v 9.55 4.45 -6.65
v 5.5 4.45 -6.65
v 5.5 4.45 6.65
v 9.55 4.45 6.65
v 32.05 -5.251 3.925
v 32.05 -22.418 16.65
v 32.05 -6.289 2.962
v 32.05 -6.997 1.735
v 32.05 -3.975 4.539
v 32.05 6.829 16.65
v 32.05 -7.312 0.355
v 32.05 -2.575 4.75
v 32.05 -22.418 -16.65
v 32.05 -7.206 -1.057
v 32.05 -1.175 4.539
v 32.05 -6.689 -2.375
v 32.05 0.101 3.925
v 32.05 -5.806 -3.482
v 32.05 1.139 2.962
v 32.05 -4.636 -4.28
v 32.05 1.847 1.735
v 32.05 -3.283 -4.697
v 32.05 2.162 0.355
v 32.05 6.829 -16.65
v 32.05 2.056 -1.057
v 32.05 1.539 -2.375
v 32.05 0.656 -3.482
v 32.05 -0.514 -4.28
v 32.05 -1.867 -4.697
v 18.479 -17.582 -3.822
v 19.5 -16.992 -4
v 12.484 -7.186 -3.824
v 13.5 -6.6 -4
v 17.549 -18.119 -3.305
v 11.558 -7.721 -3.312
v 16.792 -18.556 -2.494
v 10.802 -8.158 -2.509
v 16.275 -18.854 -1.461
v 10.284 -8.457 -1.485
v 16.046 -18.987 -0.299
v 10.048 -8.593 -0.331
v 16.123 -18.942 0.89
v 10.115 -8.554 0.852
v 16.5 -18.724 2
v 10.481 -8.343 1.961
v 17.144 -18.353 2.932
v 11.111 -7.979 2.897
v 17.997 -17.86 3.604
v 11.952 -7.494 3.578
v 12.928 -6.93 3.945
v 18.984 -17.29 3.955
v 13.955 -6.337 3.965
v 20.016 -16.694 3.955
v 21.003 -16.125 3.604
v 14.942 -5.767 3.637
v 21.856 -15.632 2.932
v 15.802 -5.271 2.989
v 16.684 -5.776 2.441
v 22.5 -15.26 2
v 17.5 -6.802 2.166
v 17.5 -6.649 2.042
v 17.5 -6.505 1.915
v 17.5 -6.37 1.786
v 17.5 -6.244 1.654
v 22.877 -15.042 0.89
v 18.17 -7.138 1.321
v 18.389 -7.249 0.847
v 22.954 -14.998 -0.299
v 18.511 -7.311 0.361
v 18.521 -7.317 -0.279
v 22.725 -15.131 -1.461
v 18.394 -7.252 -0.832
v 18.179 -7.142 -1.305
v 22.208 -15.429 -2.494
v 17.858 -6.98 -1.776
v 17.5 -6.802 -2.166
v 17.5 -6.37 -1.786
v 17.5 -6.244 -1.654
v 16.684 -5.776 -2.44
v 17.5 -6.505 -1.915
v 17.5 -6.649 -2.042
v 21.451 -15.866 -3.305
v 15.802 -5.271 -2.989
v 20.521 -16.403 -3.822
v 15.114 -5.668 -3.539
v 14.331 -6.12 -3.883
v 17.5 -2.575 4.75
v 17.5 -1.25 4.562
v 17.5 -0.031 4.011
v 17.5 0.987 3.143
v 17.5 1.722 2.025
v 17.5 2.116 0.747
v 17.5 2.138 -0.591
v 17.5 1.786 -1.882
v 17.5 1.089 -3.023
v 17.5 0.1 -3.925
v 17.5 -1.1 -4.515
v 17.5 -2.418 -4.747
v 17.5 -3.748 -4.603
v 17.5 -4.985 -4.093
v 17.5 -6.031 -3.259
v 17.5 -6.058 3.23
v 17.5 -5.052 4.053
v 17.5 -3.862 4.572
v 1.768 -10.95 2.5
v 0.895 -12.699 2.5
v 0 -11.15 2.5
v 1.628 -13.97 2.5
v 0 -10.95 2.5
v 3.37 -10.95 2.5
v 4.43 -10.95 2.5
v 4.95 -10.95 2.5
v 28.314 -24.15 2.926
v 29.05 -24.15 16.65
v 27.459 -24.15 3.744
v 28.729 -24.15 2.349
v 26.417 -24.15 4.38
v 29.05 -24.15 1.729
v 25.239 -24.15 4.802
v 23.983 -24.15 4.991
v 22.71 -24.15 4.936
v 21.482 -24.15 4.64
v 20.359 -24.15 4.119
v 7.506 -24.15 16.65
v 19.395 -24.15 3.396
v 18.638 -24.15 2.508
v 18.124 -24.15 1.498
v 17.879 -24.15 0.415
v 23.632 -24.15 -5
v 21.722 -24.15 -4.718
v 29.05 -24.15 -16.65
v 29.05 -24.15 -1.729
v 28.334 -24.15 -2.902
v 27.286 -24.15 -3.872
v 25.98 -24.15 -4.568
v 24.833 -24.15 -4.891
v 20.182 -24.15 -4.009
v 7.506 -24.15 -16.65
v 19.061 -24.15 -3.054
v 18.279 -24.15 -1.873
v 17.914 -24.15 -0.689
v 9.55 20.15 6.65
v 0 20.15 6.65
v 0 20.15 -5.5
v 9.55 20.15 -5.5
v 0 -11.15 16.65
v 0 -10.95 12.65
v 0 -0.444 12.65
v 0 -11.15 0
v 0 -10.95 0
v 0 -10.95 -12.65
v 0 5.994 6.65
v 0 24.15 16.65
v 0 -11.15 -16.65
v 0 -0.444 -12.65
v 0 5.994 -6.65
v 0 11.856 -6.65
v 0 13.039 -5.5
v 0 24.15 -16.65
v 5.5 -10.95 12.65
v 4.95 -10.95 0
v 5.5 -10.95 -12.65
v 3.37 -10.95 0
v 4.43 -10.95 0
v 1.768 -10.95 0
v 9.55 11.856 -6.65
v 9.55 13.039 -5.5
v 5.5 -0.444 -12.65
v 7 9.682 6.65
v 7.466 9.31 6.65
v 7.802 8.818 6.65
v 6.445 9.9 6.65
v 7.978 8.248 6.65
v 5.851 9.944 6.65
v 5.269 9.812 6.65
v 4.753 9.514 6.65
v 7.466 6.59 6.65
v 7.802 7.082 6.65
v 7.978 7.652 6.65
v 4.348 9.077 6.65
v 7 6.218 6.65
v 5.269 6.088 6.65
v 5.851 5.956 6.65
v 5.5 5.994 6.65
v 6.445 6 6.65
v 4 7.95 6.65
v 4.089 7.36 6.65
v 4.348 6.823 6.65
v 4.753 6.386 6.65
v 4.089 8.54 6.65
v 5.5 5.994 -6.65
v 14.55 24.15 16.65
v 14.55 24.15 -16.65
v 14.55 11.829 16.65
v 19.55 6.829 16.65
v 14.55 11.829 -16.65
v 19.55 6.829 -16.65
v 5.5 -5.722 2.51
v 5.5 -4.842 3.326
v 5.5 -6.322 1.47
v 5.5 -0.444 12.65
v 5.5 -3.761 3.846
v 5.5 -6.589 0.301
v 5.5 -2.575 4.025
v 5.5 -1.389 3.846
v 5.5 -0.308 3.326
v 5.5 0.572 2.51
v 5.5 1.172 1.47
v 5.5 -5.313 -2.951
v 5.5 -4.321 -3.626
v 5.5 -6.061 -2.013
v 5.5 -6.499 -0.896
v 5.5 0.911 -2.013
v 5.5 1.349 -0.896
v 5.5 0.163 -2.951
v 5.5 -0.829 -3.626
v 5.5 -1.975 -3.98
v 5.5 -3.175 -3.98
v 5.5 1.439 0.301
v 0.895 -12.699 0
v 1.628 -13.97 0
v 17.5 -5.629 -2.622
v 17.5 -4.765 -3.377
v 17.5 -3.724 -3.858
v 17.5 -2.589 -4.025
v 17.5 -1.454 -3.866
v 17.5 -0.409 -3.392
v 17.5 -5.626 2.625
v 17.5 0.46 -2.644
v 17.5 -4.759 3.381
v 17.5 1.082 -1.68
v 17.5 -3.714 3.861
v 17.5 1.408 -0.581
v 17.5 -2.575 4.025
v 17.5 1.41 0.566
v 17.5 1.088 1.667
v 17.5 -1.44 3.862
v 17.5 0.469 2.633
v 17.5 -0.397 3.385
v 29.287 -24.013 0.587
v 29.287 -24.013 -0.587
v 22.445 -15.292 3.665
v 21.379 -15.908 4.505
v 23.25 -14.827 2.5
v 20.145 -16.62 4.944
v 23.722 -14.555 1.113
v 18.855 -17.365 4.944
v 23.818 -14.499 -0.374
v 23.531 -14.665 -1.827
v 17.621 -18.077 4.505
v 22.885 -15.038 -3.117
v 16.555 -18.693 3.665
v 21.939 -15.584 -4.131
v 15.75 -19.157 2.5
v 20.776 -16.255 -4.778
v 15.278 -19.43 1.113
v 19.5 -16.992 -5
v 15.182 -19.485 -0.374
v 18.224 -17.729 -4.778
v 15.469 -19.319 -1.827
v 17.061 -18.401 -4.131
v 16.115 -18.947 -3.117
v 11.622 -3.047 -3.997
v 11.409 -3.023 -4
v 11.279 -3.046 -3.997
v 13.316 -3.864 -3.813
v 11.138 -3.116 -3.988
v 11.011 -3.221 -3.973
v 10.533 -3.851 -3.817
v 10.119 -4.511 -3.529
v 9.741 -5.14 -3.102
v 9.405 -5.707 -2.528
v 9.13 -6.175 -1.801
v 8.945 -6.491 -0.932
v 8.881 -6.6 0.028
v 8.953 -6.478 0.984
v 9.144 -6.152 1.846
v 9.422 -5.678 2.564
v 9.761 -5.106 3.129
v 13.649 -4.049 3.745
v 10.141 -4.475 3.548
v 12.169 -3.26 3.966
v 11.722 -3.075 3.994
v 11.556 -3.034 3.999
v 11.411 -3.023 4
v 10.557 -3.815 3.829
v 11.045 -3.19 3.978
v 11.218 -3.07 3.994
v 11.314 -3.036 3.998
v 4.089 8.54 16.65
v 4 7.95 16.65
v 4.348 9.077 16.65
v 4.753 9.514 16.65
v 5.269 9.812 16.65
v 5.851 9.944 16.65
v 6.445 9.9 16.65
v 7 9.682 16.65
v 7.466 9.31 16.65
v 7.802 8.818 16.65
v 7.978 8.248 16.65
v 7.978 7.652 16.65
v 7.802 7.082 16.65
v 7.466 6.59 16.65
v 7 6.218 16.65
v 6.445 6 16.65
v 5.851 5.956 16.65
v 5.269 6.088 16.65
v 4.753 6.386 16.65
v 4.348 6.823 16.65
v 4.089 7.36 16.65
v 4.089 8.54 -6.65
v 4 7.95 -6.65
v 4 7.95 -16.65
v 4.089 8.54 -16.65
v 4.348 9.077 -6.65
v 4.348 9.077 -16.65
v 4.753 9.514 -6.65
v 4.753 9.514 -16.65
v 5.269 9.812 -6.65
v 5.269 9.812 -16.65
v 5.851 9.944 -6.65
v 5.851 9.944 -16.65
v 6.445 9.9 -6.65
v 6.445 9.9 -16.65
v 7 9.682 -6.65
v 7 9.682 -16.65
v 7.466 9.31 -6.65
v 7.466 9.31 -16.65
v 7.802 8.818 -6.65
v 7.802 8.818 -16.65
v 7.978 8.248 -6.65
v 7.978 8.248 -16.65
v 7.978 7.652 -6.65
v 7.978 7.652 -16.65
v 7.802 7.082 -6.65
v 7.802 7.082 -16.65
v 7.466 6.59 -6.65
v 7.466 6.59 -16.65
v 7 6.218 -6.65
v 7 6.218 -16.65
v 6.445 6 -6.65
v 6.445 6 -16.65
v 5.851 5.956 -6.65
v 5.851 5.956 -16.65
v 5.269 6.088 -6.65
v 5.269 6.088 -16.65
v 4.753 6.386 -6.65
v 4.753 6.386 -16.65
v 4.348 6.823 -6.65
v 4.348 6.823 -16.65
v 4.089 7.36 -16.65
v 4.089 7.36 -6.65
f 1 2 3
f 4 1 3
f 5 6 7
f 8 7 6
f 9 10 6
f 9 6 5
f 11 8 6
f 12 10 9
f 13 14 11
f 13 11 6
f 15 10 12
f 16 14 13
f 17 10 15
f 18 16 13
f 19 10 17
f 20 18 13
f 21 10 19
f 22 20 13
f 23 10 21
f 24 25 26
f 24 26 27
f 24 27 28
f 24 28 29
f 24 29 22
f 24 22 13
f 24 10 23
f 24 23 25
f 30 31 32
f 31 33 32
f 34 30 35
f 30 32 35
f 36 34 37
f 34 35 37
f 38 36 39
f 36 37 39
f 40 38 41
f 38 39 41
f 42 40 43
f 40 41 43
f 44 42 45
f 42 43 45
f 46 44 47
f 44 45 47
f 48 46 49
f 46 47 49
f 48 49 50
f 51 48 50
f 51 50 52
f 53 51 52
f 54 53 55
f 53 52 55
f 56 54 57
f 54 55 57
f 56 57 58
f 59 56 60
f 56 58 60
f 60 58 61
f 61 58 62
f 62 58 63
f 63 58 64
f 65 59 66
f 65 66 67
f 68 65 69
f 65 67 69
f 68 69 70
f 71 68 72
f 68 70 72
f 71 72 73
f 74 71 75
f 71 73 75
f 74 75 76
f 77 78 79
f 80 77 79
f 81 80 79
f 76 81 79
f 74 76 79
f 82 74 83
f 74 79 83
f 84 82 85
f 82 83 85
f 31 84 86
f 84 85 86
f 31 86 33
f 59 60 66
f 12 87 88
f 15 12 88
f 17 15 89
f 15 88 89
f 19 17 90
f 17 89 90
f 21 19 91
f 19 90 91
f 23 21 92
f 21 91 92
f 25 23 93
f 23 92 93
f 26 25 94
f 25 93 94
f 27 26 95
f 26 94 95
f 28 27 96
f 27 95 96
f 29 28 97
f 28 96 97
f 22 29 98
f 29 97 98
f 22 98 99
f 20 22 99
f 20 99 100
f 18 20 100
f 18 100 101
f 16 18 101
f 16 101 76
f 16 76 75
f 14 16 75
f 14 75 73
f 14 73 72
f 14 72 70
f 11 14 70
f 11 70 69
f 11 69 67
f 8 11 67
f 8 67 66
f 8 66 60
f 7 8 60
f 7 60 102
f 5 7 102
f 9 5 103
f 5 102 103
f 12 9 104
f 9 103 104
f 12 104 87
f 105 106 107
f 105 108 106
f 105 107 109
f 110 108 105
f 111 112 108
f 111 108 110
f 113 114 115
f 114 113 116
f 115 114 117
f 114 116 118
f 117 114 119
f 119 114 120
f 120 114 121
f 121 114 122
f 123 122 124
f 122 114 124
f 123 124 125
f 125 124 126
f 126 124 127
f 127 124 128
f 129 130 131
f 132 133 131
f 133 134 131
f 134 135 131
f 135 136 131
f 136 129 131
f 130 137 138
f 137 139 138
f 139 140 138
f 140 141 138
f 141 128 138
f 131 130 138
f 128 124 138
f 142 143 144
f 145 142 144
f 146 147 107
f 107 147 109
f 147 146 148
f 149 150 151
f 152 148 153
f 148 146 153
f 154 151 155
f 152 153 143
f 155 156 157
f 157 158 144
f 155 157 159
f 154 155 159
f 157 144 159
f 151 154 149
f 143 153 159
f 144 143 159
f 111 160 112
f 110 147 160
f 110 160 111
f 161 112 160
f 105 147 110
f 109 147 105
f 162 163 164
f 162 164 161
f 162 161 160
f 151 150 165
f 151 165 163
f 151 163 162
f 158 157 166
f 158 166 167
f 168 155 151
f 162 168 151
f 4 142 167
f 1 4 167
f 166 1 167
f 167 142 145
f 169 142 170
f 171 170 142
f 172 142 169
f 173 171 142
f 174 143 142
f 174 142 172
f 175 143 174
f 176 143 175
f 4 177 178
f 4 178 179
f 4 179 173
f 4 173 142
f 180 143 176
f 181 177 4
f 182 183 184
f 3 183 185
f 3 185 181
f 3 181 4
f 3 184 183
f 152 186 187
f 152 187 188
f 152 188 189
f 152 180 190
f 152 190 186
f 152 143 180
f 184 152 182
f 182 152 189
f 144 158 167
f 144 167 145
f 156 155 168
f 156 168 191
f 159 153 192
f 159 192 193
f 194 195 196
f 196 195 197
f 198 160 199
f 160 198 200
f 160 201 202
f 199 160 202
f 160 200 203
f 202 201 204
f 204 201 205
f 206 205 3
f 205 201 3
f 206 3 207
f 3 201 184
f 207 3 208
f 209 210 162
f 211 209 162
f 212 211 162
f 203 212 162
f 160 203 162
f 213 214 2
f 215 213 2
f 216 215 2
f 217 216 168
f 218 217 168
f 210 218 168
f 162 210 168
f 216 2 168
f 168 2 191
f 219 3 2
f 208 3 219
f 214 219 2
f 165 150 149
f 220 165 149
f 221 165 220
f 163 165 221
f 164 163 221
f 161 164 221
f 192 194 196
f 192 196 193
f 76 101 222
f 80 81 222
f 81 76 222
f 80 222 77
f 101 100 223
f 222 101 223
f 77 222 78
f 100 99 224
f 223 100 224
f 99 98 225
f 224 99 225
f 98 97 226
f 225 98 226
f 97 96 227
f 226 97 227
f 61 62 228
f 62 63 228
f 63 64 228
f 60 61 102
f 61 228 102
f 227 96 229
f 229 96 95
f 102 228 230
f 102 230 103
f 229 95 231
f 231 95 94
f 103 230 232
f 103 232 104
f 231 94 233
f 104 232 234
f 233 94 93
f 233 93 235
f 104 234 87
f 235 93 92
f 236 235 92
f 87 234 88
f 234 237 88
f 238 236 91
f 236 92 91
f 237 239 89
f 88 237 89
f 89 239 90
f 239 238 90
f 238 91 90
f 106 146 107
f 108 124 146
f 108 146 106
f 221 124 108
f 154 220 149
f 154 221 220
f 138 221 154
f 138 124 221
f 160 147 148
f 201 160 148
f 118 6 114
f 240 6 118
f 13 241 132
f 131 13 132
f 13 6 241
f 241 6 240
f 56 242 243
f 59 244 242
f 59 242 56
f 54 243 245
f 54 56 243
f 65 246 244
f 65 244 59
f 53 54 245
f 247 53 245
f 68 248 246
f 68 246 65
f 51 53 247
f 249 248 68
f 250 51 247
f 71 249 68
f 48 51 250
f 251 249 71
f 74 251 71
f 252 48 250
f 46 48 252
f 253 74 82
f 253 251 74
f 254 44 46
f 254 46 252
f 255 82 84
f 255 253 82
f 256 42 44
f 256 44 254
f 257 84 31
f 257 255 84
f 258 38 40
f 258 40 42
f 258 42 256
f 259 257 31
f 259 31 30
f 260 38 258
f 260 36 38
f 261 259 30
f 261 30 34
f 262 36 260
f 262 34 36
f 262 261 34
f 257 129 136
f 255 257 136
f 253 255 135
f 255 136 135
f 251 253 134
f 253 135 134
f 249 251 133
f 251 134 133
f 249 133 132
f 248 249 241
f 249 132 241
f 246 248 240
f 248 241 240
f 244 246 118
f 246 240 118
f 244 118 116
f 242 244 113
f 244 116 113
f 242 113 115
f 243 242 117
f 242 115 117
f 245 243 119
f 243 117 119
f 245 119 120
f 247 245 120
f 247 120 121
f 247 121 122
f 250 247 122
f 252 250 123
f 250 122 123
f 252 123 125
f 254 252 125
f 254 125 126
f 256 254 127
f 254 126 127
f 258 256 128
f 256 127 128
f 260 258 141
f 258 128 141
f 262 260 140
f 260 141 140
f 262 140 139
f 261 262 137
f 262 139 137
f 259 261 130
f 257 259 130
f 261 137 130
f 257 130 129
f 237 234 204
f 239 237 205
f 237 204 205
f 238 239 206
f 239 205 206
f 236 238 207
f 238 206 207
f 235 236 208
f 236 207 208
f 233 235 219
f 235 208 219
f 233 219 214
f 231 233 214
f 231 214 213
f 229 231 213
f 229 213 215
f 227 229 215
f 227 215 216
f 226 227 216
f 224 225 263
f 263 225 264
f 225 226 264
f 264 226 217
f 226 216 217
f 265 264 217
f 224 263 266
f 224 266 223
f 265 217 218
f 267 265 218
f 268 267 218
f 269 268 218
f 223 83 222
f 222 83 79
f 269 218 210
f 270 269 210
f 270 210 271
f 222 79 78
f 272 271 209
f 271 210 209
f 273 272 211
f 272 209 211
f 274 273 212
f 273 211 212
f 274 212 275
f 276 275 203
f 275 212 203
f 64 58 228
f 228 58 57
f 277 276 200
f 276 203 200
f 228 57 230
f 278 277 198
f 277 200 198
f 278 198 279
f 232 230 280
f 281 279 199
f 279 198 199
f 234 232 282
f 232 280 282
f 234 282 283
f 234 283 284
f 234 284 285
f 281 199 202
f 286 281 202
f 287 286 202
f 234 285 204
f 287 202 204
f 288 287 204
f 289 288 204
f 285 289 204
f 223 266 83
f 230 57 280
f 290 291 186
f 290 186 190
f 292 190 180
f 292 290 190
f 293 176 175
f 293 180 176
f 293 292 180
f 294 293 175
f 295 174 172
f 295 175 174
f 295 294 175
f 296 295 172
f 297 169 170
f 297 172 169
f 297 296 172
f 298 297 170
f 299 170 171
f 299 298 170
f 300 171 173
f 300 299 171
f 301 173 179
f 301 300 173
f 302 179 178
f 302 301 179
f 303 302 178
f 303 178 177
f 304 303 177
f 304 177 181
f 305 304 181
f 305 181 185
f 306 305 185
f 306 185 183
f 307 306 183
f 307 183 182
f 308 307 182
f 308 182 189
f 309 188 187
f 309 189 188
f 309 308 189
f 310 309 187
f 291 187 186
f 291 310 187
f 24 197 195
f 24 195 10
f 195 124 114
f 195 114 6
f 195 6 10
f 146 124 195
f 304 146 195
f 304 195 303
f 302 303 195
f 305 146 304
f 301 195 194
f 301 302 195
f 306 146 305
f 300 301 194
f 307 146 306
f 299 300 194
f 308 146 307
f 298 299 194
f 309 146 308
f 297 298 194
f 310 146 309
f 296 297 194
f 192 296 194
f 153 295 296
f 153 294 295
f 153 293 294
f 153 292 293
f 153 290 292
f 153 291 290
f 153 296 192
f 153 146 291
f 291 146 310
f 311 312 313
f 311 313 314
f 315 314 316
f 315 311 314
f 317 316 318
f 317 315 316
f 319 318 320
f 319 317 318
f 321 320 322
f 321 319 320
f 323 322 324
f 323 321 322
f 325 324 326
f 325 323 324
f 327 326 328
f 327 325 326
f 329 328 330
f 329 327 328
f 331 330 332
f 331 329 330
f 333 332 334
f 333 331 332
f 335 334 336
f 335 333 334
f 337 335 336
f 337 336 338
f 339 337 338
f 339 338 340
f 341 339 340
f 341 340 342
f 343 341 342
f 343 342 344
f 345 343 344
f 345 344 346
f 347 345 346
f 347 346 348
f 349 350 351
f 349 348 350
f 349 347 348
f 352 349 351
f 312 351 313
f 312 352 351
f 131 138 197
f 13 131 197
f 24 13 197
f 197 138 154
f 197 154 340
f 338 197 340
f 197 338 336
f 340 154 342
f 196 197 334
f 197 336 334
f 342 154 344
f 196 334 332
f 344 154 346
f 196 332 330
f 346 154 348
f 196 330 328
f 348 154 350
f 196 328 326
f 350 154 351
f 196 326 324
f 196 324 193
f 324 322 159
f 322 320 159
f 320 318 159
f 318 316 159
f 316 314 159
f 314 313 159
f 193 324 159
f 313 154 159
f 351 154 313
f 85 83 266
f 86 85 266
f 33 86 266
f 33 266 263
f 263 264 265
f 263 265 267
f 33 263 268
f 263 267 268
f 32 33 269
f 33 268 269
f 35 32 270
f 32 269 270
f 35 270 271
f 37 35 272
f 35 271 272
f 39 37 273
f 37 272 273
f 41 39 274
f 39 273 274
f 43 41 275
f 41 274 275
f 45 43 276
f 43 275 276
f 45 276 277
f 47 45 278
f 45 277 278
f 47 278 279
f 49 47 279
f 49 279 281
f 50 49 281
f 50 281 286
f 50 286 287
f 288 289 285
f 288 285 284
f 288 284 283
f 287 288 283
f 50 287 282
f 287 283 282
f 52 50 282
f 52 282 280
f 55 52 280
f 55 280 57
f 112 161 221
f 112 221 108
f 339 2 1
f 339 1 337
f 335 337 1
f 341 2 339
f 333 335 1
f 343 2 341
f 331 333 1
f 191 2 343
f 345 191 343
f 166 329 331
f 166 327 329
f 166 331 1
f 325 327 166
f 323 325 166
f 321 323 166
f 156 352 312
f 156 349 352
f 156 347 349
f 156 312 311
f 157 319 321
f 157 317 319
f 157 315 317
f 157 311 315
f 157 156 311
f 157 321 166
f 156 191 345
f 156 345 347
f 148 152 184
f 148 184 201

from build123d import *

# Parameters (mm, degrees)
SKETCH1_W               = 33.3
SKETCH1_H               = 48.3
BOSS_EXTRUDE1_DEPTH     = 9.55
CUT_EXTRUDE1_DEPTH      = 5.5
SKETCH3_W               = 5.65
SKETCH3_H               = 13.7
CUT_EXTRUDE2_DEPTH      = 5
SKETCH5_W               = 33.3
SKETCH5_H               = 48.3
BOSS_EXTRUDE3_DEPTH     = 22.5
SKETCH6_R               = 4.025
CUT_EXTRUDE3_DEPTH      = 12
SKETCH7_R               = 4.75
CUT_EXTRUDE4_DEPTH      = 14.55
CUT_EXTRUDE6_DEPTH      = 46.909857329
CUT_EXTRUDE6_DEPTH_BACK = 46.909857329
SKETCH27_R              = 2
SKETCH30_R              = 4
SKETCH31_R              = 5
CHAMFER1_SIZE           = 13
CHAMFER1_SIZE2          = 7.505553499
CHAMFER2_SIZE           = 10
CHAMFER2_SIZE2          = 17.320508076
CHAMFER3_SIZE           = 1.732050808
CHAMFER3_SIZE_2         = 3
CROQUIS2_W              = 17.5
CROQUIS2_H              = 17.320508076
CORTAR_EXTRUIR1_DEPTH   = 48
CHAMFER4_SIZE           = 5


with BuildPart() as part:
    # Sketch1 → Boss-Extrude1 (new body)
    with BuildSketch(Plane(origin=(0, 0, 0), x_dir=(0, 0, -1), z_dir=(1, 0, 0))):
        Rectangle(SKETCH1_W, SKETCH1_H)
    extrude(amount=BOSS_EXTRUDE1_DEPTH)

    # Sketch2 → Cut-Extrude1 (cut)
    # profile 1 of 2: a face of its own
    with BuildSketch(Plane.ZY):
        Polygon((-5.5, 13.039115125), (-5.5, 20.15), (4.5, 20.15), (6.65, 20.15), (6.65, 5.993768204), (12.65, -0.443622572), (12.65, -9.1), (12.65, -10.95), (-12.65, -10.95), (-12.65, -9.1), (-12.65, -0.443622572), (-6.65, 5.993768204), (-6.65, 11.855899168), align=None)
        Polygon((4.5, 19.15), (5.65, 19.15), (5.65, 5.6), (11.65, -0.837390776), (11.65, -9.1), (11.65, -9.95), (-11.65, -9.95), (-11.65, -9.1), (-11.65, -0.837390776), (-5.65, 5.6), (-5.65, 11.45), (-4.5, 12.633215957), (-4.5, 19.15), align=None, mode=Mode.SUBTRACT)
    # profile 2 of 2: a face of its own
    with BuildSketch(Plane.ZY):
        Polygon((5.65, 19.15), (5.65, 5.6), (11.65, -0.837390776), (11.65, -9.1), (11.65, -9.95), (-11.65, -9.95), (-11.65, -9.1), (-11.65, -0.837390776), (-5.65, 5.6), (-5.65, 11.45), (-4.5, 12.633215957), (-4.5, 19.15), (4.5, 19.15), align=None)
    extrude(amount=-CUT_EXTRUDE1_DEPTH, mode=Mode.SUBTRACT)

    # Sketch3 → Cut-Extrude2 (cut)
    # profile 1 of 3: a face of its own
    with BuildSketch(Plane.ZY.offset(-5.5)):
        Polygon((-6.65, 4.45), (6.65, 4.45), (6.65, 20.15), (-5.5, 20.15), (-5.5, 13.039115125), (-6.65, 11.855899168), align=None)
        Polygon((5.65, 5.45), (5.65, 19.15), (-4.5, 19.15), (-4.5, 12.633215957), (-5.65, 11.45), (-5.65, 5.45), align=None, mode=Mode.SUBTRACT)
    # profile 2 of 3: a face of its own
    with BuildSketch(Plane.ZY.offset(-5.5)):
        Polygon((0, 5.45), (0, 19.15), (-4.5, 19.15), (-4.5, 12.633215957), (-5.65, 11.45), (-5.65, 5.45), align=None)
    # profile 3 of 3: a face of its own
    with BuildSketch(Plane.ZY.offset(-5.5)):
        with Locations((2.825, 12.3)):
            Rectangle(SKETCH3_W, SKETCH3_H)
    extrude(amount=-CUT_EXTRUDE2_DEPTH, mode=Mode.SUBTRACT)

    # Sketch5 → Boss-Extrude3 (add)
    with BuildSketch(Plane(origin=(9.55, 0, 0), x_dir=(0, 0, -1), z_dir=(1, 0, 0))):
        Rectangle(SKETCH5_W, SKETCH5_H)
    extrude(amount=BOSS_EXTRUDE3_DEPTH)

    # Sketch6 → Cut-Extrude3 (cut)
    with BuildSketch(Plane.ZY.offset(-5.5)):
        with Locations((0, -2.575)):
            Circle(SKETCH6_R)
    extrude(amount=-CUT_EXTRUDE3_DEPTH, mode=Mode.SUBTRACT)

    # Sketch7 → Cut-Extrude4 (cut)
    with BuildSketch(Plane.ZY.offset(-17.5)):
        with Locations((0, -2.575)):
            Circle(SKETCH7_R)
    extrude(amount=-CUT_EXTRUDE4_DEPTH, mode=Mode.SUBTRACT)

    # Sketch27 → Cut-Extrude6 (cut, two sides: drawn at the far end of the back side and taken through both)
    with BuildSketch(Plane(origin=(0, 0, 5.65), x_dir=(-1, 0, 0), z_dir=(0, 0, -1)).offset(-CUT_EXTRUDE6_DEPTH_BACK)):
        with Locations((-6, 7.95)):
            Circle(SKETCH27_R)
    extrude(amount=CUT_EXTRUDE6_DEPTH + CUT_EXTRUDE6_DEPTH_BACK, mode=Mode.SUBTRACT)

    # Cut-Sweep1: sweep along a path in Sketch28
    with BuildLine(Plane.XY) as cut_sweep1_path:
        Line((25.736872918, -27.79488562), (13.5, -6.6))
        Line((13.5, -6.6), (11.25, -2.702885683))
    # Sketch30 → Cut-Sweep1 (sweep, cut)
    with BuildSketch(Plane(origin=(18.469756751, -31.990557096, 0), x_dir=(0, 0, -1), z_dir=(0.500000000000001, -0.866025403784438, 0))):
        with Locations((0, 8.391342951)):
            Circle(SKETCH30_R)
    sweep(path=cut_sweep1_path.line, mode=Mode.SUBTRACT)

    # Cut-Sweep2: sweep along a path in Sketch29
    with BuildLine(Plane.XY) as cut_sweep2_path:
        Line((19.5, -16.992304845), (25.736872918, -27.79488562))
    # Sketch31 → Cut-Sweep2 (sweep, cut)
    with BuildSketch(Plane(origin=(18.469756751, -31.990557096, 0), x_dir=(0, 0, -1), z_dir=(0.500000000000001, -0.866025403784438, 0))):
        with Locations((0, 8.391342951)):
            Circle(SKETCH31_R)
    sweep(path=cut_sweep2_path.line, mode=Mode.SUBTRACT)

    # Chamfer1
    chamfer1_edges = [part.edges().sort_by_distance(p)[0] for p in [
        (0, -24.15, 0),
    ]]
    chamfer1_side = [part.faces().sort_by_distance(p)[0] for p in [
        (0, 23.563333144, 0),
    ]]
    chamfer(chamfer1_edges, length=CHAMFER1_SIZE, length2=CHAMFER1_SIZE2, reference=chamfer1_side[0])

    # Chamfer2
    chamfer2_edges = [part.edges().sort_by_distance(p)[0] for p in [
        (32.05, 24.15, 0),
    ]]
    chamfer2_side = [part.faces().sort_by_distance(p)[0] for p in [
        (16.025, 24.15, 0),
    ]]
    chamfer(chamfer2_edges, length=CHAMFER2_SIZE, length2=CHAMFER2_SIZE2, reference=chamfer2_side[0])

    # Chamfer3
    # the kernel refuses this chamfer: 3, 1.732050808 mm, written as the material it takes off along each edge
    with BuildSketch(Plane(origin=(32.05, -24.15, -24.411257264), x_dir=(0.05789386240267215, 0.9983227437537925, 0), z_dir=(0, 0, 1))) as chamfer3_piece_1:
        Polygon((CHAMFER3_SIZE * 0.998322743505, CHAMFER3_SIZE * 0.0578938623883), (-CHAMFER3_SIZE_2 * 0.0578938624027, CHAMFER3_SIZE_2 * 0.998322743754), (0, 0), align=None)
    extrude(amount=48.822514528, mode=Mode.SUBTRACT)

    # Croquis2 → Cortar-Extruir1 (cut)
    with BuildSketch(Plane.XY.offset(16.65)):
        with Locations((23.3, 15.489745962)):
            Rectangle(CROQUIS2_W, CROQUIS2_H)
    extrude(amount=-CORTAR_EXTRUIR1_DEPTH, mode=Mode.SUBTRACT)

    # Chamfer4
    chamfer4_edges = [part.edges().sort_by_distance(p)[0] for p in [
        (14.55, 6.829491924, 0),
    ]]
    chamfer(chamfer4_edges, length=CHAMFER4_SIZE)

    # Sketch33 → Cut-Loft2 section 0
    with BuildSketch(Plane.ZY):
        with BuildLine():
            Line((0, -9.95), (0, -15.45))
            Line((0, -15.45), (2.5, -15.45))
            Line((2.5, -15.45), (2.5, -9.95))
            Line((2.5, -9.95), (0, -9.95))
        make_face()
    # Sketch34 → Cut-Loft2 section 1
    with BuildSketch(Plane.ZY.offset(-5.5)):
        with BuildLine():
            Line((0, -9.95), (2.5, -9.95))
            Line((2.5, -9.95), (2.5, -10.45))
            Line((2.5, -10.45), (0, -10.45))
            Line((0, -10.45), (0, -9.95))
        make_face()
    loft(mode=Mode.SUBTRACT)


solid = part.part
